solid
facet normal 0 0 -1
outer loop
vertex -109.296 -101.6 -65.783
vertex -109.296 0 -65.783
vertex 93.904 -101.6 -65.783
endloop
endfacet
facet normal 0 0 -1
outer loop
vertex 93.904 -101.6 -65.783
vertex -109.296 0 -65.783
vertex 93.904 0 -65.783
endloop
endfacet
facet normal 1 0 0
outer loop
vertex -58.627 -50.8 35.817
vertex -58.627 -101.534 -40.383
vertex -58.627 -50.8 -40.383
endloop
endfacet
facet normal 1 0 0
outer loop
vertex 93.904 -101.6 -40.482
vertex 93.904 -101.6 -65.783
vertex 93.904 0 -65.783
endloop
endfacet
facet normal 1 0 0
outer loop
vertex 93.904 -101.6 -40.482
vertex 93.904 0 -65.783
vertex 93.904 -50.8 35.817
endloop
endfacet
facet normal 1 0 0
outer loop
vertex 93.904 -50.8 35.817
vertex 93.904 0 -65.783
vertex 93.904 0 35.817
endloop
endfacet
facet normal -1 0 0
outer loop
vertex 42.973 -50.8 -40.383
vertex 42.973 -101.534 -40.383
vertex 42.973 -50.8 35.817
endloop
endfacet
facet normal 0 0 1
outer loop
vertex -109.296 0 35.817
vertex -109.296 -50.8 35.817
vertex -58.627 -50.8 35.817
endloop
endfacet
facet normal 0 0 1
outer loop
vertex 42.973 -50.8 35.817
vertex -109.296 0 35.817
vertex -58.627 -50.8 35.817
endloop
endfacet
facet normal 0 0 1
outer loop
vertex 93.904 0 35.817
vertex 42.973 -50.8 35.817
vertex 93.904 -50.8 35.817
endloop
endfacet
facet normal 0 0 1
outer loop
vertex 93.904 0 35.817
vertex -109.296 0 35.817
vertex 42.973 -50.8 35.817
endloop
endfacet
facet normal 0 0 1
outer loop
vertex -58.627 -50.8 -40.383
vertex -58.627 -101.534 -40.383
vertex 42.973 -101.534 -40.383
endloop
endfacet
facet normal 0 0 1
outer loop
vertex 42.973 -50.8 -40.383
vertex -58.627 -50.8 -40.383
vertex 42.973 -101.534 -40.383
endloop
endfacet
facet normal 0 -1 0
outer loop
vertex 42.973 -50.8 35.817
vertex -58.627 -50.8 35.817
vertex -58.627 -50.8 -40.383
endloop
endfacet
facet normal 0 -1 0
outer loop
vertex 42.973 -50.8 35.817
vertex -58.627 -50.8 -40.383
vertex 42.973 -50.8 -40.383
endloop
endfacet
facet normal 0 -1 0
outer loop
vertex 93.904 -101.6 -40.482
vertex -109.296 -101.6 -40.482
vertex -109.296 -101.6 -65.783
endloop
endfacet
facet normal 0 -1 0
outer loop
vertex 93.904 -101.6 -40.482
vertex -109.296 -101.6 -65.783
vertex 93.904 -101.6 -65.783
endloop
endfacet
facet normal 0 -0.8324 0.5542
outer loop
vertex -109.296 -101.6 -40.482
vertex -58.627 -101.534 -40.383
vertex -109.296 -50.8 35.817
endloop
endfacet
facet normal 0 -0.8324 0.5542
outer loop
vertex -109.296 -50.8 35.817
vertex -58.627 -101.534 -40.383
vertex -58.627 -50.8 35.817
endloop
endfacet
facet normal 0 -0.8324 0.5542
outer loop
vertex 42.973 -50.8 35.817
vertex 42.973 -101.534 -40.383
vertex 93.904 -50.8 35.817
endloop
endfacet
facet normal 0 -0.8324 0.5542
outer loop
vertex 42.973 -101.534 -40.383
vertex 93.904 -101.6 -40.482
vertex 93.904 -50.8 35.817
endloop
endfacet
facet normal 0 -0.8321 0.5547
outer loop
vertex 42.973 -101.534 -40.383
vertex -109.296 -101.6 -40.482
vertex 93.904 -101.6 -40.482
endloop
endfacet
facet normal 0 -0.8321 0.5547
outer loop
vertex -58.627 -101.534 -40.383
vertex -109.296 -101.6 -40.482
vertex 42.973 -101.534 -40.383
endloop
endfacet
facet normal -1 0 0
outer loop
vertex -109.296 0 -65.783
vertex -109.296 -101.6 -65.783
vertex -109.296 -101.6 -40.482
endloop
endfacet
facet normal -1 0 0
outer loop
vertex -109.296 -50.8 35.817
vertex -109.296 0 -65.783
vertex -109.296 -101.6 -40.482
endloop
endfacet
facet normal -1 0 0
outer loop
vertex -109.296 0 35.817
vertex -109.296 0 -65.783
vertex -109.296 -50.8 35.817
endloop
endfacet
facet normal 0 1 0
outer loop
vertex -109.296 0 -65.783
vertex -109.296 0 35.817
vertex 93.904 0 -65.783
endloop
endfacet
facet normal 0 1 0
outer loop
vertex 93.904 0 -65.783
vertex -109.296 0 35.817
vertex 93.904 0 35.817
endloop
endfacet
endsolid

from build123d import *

# Parameters (mm, degrees)
F0_W     = 203.2
F0_H     = 101.6
F1_DEPTH = 101.6
F2_W     = 101.6
F2_H     = 76.2
F3_DEPTH = 50.8
F5_DEPTH = 50.8
F7_DEPTH = 203.201


with BuildPart() as f1:
    # F0 (on Front) → F1 (new body)
    with BuildSketch(Plane.XZ):
        with Locations((-7.6962560415, -14.9830856085)):
            Rectangle(F0_W, F0_H)
    extrude(amount=F1_DEPTH)

    # F2 (on face) → F3 (cut)
    with BuildSketch(Plane.XZ.offset(101.6)):
        with Locations((-7.826578486, -2.2830856085)):
            Rectangle(F2_W, F2_H)
    extrude(amount=-F3_DEPTH, mode=Mode.SUBTRACT)

    # F4 (on face) → F5 (cut)
    with BuildSketch(Plane(origin=(-109.2962560415, 0, 0), x_dir=(0, -1, 0), z_dir=(-1, 0, 0))):
        Polygon((50.8, 35.8169143915), (101.6, -40.3830856085), (101.6, 35.8169143915), align=None)
    extrude(amount=-F5_DEPTH, mode=Mode.SUBTRACT)

    # F6 (on face) → F7 (cut, through all)
    with BuildSketch(Plane.YZ.offset(93.9037439585)):
        Polygon((-101.6, 35.8169143915), (-101.6, -40.4823369622), (-50.8, 35.8169143915), align=None)
    extrude(amount=-F7_DEPTH, mode=Mode.SUBTRACT)


solid = f1.part
